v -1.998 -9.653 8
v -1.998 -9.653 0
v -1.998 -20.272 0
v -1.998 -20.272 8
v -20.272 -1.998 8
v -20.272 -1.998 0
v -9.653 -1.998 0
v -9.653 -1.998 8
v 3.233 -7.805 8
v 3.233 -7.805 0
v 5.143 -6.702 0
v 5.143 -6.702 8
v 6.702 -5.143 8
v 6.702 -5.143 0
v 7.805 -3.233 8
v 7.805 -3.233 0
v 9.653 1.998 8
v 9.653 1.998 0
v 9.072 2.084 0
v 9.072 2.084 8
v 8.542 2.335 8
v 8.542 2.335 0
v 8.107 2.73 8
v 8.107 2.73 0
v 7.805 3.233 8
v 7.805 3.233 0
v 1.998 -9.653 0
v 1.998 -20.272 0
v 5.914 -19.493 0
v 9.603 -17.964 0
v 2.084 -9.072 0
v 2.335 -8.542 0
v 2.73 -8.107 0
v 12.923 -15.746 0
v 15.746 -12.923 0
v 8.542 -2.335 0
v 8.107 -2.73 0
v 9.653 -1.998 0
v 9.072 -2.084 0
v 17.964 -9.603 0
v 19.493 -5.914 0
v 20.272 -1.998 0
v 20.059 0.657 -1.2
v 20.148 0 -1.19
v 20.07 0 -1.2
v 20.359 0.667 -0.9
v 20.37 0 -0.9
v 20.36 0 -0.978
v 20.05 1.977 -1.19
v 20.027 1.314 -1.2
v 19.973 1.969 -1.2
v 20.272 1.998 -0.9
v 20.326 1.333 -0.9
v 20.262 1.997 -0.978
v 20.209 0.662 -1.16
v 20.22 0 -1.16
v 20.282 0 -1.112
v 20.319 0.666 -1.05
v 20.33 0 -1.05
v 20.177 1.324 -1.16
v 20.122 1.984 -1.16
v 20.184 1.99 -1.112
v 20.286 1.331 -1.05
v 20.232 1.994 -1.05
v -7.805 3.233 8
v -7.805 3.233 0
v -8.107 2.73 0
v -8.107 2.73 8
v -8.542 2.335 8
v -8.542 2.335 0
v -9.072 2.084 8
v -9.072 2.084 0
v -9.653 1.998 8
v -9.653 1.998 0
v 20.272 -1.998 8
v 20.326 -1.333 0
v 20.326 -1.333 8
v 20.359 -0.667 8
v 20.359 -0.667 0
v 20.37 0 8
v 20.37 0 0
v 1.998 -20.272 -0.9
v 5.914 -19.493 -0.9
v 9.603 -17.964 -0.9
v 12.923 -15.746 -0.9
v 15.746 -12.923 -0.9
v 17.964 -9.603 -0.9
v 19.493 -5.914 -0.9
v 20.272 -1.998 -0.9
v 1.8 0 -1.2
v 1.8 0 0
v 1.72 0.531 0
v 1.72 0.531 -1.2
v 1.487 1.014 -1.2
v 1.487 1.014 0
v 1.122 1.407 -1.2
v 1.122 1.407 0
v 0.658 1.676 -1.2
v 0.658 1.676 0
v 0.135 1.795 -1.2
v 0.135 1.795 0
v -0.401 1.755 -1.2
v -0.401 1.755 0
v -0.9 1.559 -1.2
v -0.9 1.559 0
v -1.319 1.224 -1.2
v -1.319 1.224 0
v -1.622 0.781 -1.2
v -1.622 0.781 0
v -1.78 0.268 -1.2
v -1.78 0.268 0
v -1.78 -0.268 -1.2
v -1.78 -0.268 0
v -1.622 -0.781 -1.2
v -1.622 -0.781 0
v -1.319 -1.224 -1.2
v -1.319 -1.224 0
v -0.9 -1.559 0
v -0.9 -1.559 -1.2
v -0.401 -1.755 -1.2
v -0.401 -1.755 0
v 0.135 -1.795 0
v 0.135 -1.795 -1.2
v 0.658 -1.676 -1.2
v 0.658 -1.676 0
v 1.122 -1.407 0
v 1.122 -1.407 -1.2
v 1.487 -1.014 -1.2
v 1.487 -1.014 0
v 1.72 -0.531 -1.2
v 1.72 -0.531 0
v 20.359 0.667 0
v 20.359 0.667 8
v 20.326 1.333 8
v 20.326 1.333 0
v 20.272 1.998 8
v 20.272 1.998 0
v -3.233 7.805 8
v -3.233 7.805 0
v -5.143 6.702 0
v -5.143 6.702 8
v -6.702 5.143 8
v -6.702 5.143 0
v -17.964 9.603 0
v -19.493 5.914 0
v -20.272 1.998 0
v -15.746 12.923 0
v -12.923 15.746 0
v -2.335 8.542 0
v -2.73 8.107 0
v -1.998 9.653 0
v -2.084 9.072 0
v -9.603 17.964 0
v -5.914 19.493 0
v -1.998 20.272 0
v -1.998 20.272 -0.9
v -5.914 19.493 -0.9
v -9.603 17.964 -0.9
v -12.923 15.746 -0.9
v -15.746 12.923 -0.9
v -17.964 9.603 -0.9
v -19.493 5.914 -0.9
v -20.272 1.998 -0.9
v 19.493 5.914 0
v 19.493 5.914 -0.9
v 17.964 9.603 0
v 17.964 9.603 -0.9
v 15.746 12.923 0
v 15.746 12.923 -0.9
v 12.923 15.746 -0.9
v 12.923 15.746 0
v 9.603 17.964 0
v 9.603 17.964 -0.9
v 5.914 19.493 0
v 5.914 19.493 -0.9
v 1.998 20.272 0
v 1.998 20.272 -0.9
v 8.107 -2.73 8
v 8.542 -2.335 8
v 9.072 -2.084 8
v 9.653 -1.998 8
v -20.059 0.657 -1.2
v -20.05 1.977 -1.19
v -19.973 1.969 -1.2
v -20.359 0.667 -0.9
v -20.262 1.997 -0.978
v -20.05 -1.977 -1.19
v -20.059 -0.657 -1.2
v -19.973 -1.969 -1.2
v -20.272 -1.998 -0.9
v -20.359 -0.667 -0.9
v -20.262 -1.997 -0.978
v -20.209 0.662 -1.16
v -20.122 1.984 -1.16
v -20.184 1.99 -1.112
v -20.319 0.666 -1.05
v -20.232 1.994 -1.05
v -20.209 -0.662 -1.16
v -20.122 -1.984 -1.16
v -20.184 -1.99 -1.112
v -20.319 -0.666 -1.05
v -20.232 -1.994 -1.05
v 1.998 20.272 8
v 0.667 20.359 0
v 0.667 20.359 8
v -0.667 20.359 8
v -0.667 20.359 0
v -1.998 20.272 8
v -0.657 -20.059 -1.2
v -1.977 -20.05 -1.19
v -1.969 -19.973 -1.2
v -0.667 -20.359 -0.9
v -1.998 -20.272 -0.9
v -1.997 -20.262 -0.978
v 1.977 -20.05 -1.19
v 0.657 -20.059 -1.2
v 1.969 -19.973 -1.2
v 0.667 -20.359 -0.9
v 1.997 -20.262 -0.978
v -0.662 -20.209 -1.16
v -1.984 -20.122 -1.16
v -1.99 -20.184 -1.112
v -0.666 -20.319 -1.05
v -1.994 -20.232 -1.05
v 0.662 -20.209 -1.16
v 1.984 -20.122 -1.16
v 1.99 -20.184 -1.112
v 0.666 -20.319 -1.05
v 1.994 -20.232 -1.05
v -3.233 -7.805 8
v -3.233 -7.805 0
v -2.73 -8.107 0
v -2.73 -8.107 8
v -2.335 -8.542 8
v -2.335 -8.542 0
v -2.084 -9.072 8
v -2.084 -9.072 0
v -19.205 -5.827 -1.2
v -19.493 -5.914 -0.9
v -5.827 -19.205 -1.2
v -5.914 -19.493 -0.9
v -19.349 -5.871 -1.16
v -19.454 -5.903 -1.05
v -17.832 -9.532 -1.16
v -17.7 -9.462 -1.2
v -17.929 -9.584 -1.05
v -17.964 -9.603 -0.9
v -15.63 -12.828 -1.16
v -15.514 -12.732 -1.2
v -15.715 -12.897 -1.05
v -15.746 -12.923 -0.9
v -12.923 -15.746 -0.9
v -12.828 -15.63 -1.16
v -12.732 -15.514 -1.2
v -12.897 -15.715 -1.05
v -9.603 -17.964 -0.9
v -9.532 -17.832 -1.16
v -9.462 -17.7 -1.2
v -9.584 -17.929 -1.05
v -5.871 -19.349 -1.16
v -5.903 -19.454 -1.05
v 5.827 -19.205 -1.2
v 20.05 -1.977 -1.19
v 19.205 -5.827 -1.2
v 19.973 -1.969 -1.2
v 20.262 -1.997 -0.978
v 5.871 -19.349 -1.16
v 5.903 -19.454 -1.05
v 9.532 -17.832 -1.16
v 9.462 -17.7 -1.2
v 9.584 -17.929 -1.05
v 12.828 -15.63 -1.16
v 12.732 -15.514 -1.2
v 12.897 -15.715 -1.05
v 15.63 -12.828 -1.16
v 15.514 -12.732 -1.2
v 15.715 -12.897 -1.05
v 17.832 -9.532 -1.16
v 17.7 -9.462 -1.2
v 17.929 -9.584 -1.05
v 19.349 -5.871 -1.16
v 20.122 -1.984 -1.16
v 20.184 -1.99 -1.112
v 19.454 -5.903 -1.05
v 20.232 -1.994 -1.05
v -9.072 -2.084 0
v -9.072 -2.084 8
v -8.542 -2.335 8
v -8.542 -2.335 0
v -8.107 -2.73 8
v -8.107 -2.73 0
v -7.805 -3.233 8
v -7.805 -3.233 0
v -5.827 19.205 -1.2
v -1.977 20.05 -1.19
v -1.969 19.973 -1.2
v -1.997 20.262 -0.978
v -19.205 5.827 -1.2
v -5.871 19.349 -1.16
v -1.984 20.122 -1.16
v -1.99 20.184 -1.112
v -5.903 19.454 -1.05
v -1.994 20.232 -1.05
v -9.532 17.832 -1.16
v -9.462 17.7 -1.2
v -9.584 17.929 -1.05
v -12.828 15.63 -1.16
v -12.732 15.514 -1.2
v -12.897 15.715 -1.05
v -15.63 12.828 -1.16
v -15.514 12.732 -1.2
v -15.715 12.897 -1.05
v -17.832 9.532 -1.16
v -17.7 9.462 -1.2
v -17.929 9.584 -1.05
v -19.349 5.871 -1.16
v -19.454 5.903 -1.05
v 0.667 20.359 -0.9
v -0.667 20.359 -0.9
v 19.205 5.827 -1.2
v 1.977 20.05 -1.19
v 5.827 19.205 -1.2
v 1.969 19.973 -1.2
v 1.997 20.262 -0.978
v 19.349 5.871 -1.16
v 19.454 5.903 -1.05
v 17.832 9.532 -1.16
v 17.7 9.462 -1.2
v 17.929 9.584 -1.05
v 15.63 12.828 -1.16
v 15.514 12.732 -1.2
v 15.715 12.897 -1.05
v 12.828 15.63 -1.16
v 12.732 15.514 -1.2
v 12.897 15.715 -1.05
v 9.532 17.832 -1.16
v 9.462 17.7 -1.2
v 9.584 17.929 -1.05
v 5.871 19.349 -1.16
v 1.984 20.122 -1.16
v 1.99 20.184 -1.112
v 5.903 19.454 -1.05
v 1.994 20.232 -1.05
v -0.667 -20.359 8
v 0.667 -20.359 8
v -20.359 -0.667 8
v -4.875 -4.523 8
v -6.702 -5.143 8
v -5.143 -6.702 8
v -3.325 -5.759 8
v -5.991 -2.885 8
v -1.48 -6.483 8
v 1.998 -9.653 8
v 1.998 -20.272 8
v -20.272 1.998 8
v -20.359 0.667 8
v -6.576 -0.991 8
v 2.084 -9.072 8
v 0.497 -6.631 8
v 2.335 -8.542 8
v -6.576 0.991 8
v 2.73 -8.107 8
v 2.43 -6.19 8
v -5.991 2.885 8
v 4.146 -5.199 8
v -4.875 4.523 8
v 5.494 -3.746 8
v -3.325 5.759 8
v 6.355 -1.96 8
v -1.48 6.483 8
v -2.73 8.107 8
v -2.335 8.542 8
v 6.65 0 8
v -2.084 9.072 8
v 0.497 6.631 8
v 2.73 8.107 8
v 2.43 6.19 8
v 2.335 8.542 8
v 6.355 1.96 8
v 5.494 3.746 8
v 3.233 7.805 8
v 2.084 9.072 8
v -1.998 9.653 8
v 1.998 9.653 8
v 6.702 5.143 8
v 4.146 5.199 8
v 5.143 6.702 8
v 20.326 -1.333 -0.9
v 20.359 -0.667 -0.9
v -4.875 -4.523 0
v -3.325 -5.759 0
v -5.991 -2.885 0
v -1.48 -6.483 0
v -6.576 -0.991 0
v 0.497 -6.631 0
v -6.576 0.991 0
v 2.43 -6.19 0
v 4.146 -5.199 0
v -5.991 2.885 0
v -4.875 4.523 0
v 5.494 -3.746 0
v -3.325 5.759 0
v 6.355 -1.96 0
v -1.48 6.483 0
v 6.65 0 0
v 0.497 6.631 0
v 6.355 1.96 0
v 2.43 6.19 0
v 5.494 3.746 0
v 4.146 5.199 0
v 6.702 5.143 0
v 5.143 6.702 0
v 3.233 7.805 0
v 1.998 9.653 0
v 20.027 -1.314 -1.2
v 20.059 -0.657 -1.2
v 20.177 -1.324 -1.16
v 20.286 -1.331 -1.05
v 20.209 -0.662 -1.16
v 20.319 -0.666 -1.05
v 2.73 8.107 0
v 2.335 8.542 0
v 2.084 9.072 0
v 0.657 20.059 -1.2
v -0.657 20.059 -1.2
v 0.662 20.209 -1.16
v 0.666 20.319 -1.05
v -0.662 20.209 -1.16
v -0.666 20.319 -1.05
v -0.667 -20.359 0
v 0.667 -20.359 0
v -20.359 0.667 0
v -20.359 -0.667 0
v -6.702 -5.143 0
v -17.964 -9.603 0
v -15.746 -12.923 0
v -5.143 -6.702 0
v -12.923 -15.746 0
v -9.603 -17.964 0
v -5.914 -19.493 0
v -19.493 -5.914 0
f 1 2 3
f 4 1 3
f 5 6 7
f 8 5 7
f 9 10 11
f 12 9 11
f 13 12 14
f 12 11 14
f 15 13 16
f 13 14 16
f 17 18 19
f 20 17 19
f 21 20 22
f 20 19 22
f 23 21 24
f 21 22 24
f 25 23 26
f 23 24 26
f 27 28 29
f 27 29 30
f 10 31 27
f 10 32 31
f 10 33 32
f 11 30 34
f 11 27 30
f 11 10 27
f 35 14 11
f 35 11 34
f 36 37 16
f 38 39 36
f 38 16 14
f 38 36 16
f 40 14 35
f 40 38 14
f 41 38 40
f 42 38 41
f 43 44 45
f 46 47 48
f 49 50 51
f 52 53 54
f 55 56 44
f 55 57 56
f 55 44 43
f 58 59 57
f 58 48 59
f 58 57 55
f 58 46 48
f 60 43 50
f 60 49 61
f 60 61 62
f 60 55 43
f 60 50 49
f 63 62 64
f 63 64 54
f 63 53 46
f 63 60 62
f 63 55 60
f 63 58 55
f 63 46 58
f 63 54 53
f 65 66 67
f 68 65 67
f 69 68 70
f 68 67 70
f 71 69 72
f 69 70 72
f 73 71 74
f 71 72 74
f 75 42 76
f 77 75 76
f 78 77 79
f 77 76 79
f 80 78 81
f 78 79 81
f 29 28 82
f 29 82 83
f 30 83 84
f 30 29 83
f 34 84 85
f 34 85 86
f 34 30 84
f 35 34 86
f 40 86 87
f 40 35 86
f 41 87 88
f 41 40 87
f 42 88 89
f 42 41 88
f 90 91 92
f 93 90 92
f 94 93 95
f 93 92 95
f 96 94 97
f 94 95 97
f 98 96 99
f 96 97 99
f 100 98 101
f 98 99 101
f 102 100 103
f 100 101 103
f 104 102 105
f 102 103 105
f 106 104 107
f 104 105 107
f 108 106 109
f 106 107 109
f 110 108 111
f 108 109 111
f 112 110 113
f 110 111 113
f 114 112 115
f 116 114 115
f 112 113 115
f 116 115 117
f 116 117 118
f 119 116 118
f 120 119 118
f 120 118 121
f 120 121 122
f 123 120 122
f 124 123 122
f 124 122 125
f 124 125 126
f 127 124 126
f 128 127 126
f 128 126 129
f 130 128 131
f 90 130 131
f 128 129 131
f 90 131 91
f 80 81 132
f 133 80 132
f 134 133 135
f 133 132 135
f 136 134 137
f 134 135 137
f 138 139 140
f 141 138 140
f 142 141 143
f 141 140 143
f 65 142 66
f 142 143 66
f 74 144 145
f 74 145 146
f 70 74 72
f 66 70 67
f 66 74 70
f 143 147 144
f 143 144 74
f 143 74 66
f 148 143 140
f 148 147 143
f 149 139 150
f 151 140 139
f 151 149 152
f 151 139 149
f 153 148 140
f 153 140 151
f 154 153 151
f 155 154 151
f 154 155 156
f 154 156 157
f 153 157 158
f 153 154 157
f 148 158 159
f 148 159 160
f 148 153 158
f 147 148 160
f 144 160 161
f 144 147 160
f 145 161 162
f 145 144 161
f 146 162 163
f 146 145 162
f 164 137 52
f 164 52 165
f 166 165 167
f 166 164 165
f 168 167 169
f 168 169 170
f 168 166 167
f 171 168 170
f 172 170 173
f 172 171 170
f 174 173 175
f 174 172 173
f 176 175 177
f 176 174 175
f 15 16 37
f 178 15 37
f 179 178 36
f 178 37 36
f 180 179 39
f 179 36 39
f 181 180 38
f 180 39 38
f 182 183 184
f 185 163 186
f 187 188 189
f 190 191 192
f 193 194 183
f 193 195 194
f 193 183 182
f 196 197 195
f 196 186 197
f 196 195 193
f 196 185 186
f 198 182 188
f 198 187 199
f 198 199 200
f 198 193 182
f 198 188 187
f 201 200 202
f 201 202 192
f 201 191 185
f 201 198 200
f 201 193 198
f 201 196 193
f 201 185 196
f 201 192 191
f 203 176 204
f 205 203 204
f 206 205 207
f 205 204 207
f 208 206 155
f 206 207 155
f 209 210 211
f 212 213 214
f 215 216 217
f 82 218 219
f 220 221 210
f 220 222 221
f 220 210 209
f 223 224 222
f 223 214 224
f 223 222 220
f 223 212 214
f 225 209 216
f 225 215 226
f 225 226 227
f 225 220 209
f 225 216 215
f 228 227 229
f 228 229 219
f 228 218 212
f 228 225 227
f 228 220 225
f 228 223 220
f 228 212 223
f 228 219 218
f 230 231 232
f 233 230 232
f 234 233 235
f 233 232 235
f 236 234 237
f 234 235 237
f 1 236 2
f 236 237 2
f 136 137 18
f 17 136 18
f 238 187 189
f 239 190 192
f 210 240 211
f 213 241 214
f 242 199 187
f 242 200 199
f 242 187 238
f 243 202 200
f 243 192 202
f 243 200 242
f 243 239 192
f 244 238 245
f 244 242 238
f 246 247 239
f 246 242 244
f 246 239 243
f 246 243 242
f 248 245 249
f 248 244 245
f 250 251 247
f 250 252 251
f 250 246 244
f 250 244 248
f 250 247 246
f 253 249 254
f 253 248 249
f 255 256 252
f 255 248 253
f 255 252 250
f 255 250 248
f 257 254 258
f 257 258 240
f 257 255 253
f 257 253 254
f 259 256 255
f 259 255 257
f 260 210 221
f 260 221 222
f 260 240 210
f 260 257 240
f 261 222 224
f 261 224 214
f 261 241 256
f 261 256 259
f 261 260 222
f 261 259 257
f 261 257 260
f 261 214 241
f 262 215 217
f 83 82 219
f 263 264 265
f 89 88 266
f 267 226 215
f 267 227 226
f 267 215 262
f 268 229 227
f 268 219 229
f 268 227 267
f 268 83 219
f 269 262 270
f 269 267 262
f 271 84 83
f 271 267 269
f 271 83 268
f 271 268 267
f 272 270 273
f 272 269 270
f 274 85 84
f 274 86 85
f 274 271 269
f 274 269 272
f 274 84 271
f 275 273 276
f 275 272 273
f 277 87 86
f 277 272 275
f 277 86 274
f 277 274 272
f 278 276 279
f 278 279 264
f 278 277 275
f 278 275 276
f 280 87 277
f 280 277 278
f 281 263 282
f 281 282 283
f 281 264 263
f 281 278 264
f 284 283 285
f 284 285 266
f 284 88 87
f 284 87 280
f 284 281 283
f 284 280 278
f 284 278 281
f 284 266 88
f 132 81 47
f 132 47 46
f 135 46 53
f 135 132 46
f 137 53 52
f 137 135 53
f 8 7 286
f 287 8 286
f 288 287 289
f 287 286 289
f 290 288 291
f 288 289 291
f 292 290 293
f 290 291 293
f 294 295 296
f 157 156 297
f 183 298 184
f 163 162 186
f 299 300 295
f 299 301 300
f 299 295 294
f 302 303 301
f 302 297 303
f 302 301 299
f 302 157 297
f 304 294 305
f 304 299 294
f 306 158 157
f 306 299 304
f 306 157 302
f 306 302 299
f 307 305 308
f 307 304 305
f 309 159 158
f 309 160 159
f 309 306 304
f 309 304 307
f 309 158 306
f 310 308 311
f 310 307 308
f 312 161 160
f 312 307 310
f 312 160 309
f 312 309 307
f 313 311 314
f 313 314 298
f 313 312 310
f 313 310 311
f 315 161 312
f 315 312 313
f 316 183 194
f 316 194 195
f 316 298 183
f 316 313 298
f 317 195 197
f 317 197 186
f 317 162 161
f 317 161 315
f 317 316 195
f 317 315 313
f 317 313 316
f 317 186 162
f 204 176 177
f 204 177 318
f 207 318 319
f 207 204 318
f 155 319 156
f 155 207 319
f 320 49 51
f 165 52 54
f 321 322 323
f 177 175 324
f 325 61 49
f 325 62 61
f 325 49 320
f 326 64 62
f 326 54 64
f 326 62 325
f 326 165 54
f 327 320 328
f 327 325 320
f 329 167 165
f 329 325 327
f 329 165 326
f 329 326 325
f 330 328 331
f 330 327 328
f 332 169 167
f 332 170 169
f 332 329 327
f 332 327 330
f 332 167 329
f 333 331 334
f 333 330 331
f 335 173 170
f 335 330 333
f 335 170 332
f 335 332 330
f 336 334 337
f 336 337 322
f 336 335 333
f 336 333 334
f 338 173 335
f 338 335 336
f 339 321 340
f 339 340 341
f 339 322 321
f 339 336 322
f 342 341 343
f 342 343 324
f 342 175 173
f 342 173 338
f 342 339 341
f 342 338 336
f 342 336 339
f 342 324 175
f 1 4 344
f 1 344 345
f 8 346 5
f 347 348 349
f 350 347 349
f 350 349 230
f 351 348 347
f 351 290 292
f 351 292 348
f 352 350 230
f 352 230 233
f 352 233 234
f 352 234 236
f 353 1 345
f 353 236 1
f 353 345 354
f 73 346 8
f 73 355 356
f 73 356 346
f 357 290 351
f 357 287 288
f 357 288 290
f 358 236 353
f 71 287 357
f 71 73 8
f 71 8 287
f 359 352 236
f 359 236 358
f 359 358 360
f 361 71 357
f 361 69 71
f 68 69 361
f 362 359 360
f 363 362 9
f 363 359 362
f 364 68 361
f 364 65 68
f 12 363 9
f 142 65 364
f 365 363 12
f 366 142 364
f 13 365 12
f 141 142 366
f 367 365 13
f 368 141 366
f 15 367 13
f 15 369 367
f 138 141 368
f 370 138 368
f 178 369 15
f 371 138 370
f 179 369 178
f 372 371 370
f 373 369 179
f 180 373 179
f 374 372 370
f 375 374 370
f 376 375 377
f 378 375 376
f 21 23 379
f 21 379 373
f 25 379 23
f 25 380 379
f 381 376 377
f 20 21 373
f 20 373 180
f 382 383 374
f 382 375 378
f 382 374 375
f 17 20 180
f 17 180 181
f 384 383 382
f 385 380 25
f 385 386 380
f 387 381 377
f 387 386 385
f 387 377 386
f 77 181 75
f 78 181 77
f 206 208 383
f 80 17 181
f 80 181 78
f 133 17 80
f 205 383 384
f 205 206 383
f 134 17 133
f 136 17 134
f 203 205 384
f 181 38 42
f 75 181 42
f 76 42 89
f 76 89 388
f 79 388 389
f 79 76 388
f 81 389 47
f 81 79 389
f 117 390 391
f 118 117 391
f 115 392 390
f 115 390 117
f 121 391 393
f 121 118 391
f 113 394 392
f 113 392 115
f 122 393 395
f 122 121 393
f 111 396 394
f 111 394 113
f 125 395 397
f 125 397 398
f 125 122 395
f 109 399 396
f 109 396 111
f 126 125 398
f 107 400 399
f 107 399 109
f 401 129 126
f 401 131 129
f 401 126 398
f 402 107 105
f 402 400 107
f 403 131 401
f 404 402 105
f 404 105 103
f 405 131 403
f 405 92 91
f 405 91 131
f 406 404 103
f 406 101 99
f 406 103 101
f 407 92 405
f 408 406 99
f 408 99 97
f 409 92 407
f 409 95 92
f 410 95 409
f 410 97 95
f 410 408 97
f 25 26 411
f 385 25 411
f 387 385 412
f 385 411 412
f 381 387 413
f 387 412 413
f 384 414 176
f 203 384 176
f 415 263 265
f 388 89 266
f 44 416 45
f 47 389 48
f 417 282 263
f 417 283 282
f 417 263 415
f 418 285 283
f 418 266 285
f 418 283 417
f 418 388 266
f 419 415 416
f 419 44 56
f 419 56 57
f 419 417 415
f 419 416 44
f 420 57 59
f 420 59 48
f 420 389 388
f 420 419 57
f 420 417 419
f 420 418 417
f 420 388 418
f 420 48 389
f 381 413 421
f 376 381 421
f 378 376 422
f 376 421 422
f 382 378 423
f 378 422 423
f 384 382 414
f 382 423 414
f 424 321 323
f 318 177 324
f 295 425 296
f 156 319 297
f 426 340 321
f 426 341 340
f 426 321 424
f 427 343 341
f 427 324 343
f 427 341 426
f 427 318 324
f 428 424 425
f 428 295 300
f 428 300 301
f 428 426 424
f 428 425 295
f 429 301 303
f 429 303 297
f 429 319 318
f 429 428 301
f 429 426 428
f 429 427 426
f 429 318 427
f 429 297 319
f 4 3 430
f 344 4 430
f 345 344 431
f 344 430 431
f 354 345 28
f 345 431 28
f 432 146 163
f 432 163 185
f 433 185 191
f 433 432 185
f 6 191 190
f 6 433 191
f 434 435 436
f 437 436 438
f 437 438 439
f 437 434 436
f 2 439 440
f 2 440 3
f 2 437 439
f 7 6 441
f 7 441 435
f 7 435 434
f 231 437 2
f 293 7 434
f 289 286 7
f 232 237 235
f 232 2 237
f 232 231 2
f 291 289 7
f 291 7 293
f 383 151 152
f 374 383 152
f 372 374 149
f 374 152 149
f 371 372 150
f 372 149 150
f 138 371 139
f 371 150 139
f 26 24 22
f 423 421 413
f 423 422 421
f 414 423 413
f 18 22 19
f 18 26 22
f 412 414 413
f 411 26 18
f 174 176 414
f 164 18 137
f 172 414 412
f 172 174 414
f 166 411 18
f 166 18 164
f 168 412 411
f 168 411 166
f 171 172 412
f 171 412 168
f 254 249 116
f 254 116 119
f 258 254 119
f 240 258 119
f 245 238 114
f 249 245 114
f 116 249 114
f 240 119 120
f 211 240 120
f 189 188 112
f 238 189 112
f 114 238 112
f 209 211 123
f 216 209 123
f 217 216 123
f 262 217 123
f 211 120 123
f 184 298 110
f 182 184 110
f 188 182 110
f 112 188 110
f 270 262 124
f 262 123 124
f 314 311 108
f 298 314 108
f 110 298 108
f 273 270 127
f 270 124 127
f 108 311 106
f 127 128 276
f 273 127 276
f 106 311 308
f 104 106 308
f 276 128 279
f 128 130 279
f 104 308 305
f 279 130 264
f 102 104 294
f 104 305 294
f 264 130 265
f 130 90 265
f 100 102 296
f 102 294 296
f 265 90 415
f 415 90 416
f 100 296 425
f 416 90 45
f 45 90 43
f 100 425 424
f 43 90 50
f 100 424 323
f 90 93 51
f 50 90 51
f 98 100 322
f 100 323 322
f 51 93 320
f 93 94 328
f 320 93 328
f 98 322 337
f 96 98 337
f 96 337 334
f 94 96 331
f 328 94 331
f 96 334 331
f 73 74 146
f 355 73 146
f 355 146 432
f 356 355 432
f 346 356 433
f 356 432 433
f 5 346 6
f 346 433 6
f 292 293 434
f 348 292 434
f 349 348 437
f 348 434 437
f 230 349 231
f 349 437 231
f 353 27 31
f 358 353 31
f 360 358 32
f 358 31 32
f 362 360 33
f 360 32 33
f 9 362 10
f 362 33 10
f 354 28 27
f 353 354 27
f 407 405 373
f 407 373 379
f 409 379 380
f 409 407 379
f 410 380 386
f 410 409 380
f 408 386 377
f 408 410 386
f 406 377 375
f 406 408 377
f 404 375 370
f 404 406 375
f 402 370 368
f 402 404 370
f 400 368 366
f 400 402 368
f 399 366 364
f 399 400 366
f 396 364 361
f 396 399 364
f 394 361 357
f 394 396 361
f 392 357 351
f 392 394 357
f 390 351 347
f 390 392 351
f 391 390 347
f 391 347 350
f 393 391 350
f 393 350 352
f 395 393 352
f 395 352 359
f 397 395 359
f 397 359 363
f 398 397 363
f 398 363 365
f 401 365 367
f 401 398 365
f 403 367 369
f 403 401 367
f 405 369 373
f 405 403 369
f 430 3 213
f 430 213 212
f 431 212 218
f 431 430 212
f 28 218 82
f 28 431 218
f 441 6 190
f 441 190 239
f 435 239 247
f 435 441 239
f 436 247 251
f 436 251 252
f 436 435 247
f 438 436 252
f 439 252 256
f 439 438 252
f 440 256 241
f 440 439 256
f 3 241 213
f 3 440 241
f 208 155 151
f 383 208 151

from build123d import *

# Parameters (mm, degrees)
F0_R     = 6.65
F0_R_2   = 1.8
F1_DEPTH = 1.2
F2_DEPTH = 8
F3_R     = 0.3


# Not quite as in the source:
# - a feature names something its author has since deleted; it is built from what else it names


with BuildPart() as f1:
    # F0 (on Top) → F1 (new body)
    with BuildSketch(Plane.XY):
        with BuildLine():
            Line((9.6529388756, 1.998378199), (20.2717385681, 1.998378199))
            ThreePointArc((20.2717385681, 1.998378199), (14.4037651328, 14.4037651328), (1.998378199, 20.2717385681))
            Line((1.998378199, 20.2717385681), (1.998378199, 9.6529388756))
            ThreePointArc((1.998378199, 9.6529388756), (2.3354389744, 8.5417984096), (3.2330113343, 7.8051798106))
            ThreePointArc((3.2330113343, 7.8051798106), (5.9738260003, 5.9738260003), (7.8051798106, 3.2330113343))
            ThreePointArc((7.8051798106, 3.2330113343), (8.5417984096, 2.3354389744), (9.6529388756, 1.998378199))
        make_face()
        with BuildLine():
            Line((-1.998378199, 9.6529388756), (-1.998378199, 20.2717385681))
            ThreePointArc((-1.998378199, 20.2717385681), (-14.4037651328, 14.4037651328), (-20.2717385681, 1.998378199))
            Line((-20.2717385681, 1.998378199), (-9.6529388756, 1.998378199))
            ThreePointArc((-9.6529388756, 1.998378199), (-8.5417984096, 2.3354389744), (-7.8051798106, 3.2330113343))
            ThreePointArc((-7.8051798106, 3.2330113343), (-5.9738260003, 5.9738260003), (-3.2330113343, 7.8051798106))
            ThreePointArc((-3.2330113343, 7.8051798106), (-2.3354389744, 8.5417984096), (-1.998378199, 9.6529388756))
        make_face()
        with BuildLine():
            ThreePointArc((-20.2717385681, -1.998378199), (-14.4037651328, -14.4037651328), (-1.998378199, -20.2717385681))
            Line((-1.998378199, -20.2717385681), (-1.998378199, -9.6529388756))
            ThreePointArc((-1.998378199, -9.6529388756), (-2.3354389744, -8.5417984096), (-3.2330113343, -7.8051798106))
            ThreePointArc((-3.2330113343, -7.8051798106), (-5.9738260003, -5.9738260003), (-7.8051798106, -3.2330113343))
            ThreePointArc((-7.8051798106, -3.2330113343), (-8.5417984096, -2.3354389744), (-9.6529388756, -1.998378199))
            Line((-9.6529388756, -1.998378199), (-20.2717385681, -1.998378199))
        make_face()
        with BuildLine():
            ThreePointArc((1.998378199, -20.2717385681), (14.4037651328, -14.4037651328), (20.2717385681, -1.998378199))
            Line((20.2717385681, -1.998378199), (9.6529388756, -1.998378199))
            ThreePointArc((9.6529388756, -1.998378199), (8.5417984096, -2.3354389744), (7.8051798106, -3.2330113343))
            ThreePointArc((7.8051798106, -3.2330113343), (5.9738260003, -5.9738260003), (3.2330113343, -7.8051798106))
            ThreePointArc((3.2330113343, -7.8051798106), (2.3354389744, -8.5417984096), (1.998378199, -9.6529388756))
            Line((1.998378199, -9.6529388756), (1.998378199, -20.2717385681))
        make_face()
        with BuildLine():
            ThreePointArc((20.2717385681, -1.998378199), (20.3454198117, -1.0003962634), (20.37, 0))
            ThreePointArc((20.37, 0), (20.3454198117, 1.0003962634), (20.2717385681, 1.998378199))
            Line((20.2717385681, 1.998378199), (9.6529388756, 1.998378199))
            ThreePointArc((9.6529388756, 1.998378199), (8.5417984096, 2.3354389744), (7.8051798106, 3.2330113343))
            ThreePointArc((7.8051798106, 3.2330113343), (5.9738260003, 5.9738260003), (3.2330113343, 7.8051798106))
            ThreePointArc((3.2330113343, 7.8051798106), (2.3354389744, 8.5417984096), (1.998378199, 9.6529388756))
            Line((1.998378199, 9.6529388756), (1.998378199, 20.2717385681))
            ThreePointArc((1.998378199, 20.2717385681), (0, 20.37), (-1.998378199, 20.2717385681))
            Line((-1.998378199, 20.2717385681), (-1.998378199, 9.6529388756))
            ThreePointArc((-1.998378199, 9.6529388756), (-2.3354389744, 8.5417984096), (-3.2330113343, 7.8051798106))
            ThreePointArc((-3.2330113343, 7.8051798106), (-5.9738260003, 5.9738260003), (-7.8051798106, 3.2330113343))
            ThreePointArc((-7.8051798106, 3.2330113343), (-8.5417984096, 2.3354389744), (-9.6529388756, 1.998378199))
            Line((-9.6529388756, 1.998378199), (-20.2717385681, 1.998378199))
            ThreePointArc((-20.2717385681, 1.998378199), (-20.37, 0), (-20.2717385681, -1.998378199))
            Line((-20.2717385681, -1.998378199), (-9.6529388756, -1.998378199))
            ThreePointArc((-9.6529388756, -1.998378199), (-8.5417984096, -2.3354389744), (-7.8051798106, -3.2330113343))
            ThreePointArc((-7.8051798106, -3.2330113343), (-5.9738260003, -5.9738260003), (-3.2330113343, -7.8051798106))
            ThreePointArc((-3.2330113343, -7.8051798106), (-2.3354389744, -8.5417984096), (-1.998378199, -9.6529388756))
            Line((-1.998378199, -9.6529388756), (-1.998378199, -20.2717385681))
            ThreePointArc((-1.998378199, -20.2717385681), (0, -20.37), (1.998378199, -20.2717385681))
            Line((1.998378199, -20.2717385681), (1.998378199, -9.6529388756))
            ThreePointArc((1.998378199, -9.6529388756), (2.3354389744, -8.5417984096), (3.2330113343, -7.8051798106))
            ThreePointArc((3.2330113343, -7.8051798106), (5.9738260003, -5.9738260003), (7.8051798106, -3.2330113343))
            ThreePointArc((7.8051798106, -3.2330113343), (8.5417984096, -2.3354389744), (9.6529388756, -1.998378199))
            Line((9.6529388756, -1.998378199), (20.2717385681, -1.998378199))
        make_face()
        Circle(F0_R, mode=Mode.SUBTRACT)
        Circle(F0_R)
        Circle(F0_R_2, mode=Mode.SUBTRACT)
    extrude(amount=-F1_DEPTH)

    # F0 (on Top) → F2 (join)
    with BuildSketch(Plane.XY):
        with BuildLine():
            ThreePointArc((20.2717385681, -1.998378199), (20.3454198117, -1.0003962634), (20.37, 0))
            ThreePointArc((20.37, 0), (20.3454198117, 1.0003962634), (20.2717385681, 1.998378199))
            Line((20.2717385681, 1.998378199), (9.6529388756, 1.998378199))
            ThreePointArc((9.6529388756, 1.998378199), (8.5417984096, 2.3354389744), (7.8051798106, 3.2330113343))
            ThreePointArc((7.8051798106, 3.2330113343), (5.9738260003, 5.9738260003), (3.2330113343, 7.8051798106))
            ThreePointArc((3.2330113343, 7.8051798106), (2.3354389744, 8.5417984096), (1.998378199, 9.6529388756))
            Line((1.998378199, 9.6529388756), (1.998378199, 20.2717385681))
            ThreePointArc((1.998378199, 20.2717385681), (0, 20.37), (-1.998378199, 20.2717385681))
            Line((-1.998378199, 20.2717385681), (-1.998378199, 9.6529388756))
            ThreePointArc((-1.998378199, 9.6529388756), (-2.3354389744, 8.5417984096), (-3.2330113343, 7.8051798106))
            ThreePointArc((-3.2330113343, 7.8051798106), (-5.9738260003, 5.9738260003), (-7.8051798106, 3.2330113343))
            ThreePointArc((-7.8051798106, 3.2330113343), (-8.5417984096, 2.3354389744), (-9.6529388756, 1.998378199))
            Line((-9.6529388756, 1.998378199), (-20.2717385681, 1.998378199))
            ThreePointArc((-20.2717385681, 1.998378199), (-20.37, 0), (-20.2717385681, -1.998378199))
            Line((-20.2717385681, -1.998378199), (-9.6529388756, -1.998378199))
            ThreePointArc((-9.6529388756, -1.998378199), (-8.5417984096, -2.3354389744), (-7.8051798106, -3.2330113343))
            ThreePointArc((-7.8051798106, -3.2330113343), (-5.9738260003, -5.9738260003), (-3.2330113343, -7.8051798106))
            ThreePointArc((-3.2330113343, -7.8051798106), (-2.3354389744, -8.5417984096), (-1.998378199, -9.6529388756))
            Line((-1.998378199, -9.6529388756), (-1.998378199, -20.2717385681))
            ThreePointArc((-1.998378199, -20.2717385681), (0, -20.37), (1.998378199, -20.2717385681))
            Line((1.998378199, -20.2717385681), (1.998378199, -9.6529388756))
            ThreePointArc((1.998378199, -9.6529388756), (2.3354389744, -8.5417984096), (3.2330113343, -7.8051798106))
            ThreePointArc((3.2330113343, -7.8051798106), (5.9738260003, -5.9738260003), (7.8051798106, -3.2330113343))
            ThreePointArc((7.8051798106, -3.2330113343), (8.5417984096, -2.3354389744), (9.6529388756, -1.998378199))
            Line((9.6529388756, -1.998378199), (20.2717385681, -1.998378199))
        make_face()
        Circle(F0_R, mode=Mode.SUBTRACT)
    extrude(amount=F2_DEPTH)

    # F3
    f3_edges = [f1.edges().sort_by_distance(p)[0] for p in [
        (-1.998378, -20.271739, -1.2),
    ]]
    fillet(f3_edges, radius=F3_R)


solid = f1.part
